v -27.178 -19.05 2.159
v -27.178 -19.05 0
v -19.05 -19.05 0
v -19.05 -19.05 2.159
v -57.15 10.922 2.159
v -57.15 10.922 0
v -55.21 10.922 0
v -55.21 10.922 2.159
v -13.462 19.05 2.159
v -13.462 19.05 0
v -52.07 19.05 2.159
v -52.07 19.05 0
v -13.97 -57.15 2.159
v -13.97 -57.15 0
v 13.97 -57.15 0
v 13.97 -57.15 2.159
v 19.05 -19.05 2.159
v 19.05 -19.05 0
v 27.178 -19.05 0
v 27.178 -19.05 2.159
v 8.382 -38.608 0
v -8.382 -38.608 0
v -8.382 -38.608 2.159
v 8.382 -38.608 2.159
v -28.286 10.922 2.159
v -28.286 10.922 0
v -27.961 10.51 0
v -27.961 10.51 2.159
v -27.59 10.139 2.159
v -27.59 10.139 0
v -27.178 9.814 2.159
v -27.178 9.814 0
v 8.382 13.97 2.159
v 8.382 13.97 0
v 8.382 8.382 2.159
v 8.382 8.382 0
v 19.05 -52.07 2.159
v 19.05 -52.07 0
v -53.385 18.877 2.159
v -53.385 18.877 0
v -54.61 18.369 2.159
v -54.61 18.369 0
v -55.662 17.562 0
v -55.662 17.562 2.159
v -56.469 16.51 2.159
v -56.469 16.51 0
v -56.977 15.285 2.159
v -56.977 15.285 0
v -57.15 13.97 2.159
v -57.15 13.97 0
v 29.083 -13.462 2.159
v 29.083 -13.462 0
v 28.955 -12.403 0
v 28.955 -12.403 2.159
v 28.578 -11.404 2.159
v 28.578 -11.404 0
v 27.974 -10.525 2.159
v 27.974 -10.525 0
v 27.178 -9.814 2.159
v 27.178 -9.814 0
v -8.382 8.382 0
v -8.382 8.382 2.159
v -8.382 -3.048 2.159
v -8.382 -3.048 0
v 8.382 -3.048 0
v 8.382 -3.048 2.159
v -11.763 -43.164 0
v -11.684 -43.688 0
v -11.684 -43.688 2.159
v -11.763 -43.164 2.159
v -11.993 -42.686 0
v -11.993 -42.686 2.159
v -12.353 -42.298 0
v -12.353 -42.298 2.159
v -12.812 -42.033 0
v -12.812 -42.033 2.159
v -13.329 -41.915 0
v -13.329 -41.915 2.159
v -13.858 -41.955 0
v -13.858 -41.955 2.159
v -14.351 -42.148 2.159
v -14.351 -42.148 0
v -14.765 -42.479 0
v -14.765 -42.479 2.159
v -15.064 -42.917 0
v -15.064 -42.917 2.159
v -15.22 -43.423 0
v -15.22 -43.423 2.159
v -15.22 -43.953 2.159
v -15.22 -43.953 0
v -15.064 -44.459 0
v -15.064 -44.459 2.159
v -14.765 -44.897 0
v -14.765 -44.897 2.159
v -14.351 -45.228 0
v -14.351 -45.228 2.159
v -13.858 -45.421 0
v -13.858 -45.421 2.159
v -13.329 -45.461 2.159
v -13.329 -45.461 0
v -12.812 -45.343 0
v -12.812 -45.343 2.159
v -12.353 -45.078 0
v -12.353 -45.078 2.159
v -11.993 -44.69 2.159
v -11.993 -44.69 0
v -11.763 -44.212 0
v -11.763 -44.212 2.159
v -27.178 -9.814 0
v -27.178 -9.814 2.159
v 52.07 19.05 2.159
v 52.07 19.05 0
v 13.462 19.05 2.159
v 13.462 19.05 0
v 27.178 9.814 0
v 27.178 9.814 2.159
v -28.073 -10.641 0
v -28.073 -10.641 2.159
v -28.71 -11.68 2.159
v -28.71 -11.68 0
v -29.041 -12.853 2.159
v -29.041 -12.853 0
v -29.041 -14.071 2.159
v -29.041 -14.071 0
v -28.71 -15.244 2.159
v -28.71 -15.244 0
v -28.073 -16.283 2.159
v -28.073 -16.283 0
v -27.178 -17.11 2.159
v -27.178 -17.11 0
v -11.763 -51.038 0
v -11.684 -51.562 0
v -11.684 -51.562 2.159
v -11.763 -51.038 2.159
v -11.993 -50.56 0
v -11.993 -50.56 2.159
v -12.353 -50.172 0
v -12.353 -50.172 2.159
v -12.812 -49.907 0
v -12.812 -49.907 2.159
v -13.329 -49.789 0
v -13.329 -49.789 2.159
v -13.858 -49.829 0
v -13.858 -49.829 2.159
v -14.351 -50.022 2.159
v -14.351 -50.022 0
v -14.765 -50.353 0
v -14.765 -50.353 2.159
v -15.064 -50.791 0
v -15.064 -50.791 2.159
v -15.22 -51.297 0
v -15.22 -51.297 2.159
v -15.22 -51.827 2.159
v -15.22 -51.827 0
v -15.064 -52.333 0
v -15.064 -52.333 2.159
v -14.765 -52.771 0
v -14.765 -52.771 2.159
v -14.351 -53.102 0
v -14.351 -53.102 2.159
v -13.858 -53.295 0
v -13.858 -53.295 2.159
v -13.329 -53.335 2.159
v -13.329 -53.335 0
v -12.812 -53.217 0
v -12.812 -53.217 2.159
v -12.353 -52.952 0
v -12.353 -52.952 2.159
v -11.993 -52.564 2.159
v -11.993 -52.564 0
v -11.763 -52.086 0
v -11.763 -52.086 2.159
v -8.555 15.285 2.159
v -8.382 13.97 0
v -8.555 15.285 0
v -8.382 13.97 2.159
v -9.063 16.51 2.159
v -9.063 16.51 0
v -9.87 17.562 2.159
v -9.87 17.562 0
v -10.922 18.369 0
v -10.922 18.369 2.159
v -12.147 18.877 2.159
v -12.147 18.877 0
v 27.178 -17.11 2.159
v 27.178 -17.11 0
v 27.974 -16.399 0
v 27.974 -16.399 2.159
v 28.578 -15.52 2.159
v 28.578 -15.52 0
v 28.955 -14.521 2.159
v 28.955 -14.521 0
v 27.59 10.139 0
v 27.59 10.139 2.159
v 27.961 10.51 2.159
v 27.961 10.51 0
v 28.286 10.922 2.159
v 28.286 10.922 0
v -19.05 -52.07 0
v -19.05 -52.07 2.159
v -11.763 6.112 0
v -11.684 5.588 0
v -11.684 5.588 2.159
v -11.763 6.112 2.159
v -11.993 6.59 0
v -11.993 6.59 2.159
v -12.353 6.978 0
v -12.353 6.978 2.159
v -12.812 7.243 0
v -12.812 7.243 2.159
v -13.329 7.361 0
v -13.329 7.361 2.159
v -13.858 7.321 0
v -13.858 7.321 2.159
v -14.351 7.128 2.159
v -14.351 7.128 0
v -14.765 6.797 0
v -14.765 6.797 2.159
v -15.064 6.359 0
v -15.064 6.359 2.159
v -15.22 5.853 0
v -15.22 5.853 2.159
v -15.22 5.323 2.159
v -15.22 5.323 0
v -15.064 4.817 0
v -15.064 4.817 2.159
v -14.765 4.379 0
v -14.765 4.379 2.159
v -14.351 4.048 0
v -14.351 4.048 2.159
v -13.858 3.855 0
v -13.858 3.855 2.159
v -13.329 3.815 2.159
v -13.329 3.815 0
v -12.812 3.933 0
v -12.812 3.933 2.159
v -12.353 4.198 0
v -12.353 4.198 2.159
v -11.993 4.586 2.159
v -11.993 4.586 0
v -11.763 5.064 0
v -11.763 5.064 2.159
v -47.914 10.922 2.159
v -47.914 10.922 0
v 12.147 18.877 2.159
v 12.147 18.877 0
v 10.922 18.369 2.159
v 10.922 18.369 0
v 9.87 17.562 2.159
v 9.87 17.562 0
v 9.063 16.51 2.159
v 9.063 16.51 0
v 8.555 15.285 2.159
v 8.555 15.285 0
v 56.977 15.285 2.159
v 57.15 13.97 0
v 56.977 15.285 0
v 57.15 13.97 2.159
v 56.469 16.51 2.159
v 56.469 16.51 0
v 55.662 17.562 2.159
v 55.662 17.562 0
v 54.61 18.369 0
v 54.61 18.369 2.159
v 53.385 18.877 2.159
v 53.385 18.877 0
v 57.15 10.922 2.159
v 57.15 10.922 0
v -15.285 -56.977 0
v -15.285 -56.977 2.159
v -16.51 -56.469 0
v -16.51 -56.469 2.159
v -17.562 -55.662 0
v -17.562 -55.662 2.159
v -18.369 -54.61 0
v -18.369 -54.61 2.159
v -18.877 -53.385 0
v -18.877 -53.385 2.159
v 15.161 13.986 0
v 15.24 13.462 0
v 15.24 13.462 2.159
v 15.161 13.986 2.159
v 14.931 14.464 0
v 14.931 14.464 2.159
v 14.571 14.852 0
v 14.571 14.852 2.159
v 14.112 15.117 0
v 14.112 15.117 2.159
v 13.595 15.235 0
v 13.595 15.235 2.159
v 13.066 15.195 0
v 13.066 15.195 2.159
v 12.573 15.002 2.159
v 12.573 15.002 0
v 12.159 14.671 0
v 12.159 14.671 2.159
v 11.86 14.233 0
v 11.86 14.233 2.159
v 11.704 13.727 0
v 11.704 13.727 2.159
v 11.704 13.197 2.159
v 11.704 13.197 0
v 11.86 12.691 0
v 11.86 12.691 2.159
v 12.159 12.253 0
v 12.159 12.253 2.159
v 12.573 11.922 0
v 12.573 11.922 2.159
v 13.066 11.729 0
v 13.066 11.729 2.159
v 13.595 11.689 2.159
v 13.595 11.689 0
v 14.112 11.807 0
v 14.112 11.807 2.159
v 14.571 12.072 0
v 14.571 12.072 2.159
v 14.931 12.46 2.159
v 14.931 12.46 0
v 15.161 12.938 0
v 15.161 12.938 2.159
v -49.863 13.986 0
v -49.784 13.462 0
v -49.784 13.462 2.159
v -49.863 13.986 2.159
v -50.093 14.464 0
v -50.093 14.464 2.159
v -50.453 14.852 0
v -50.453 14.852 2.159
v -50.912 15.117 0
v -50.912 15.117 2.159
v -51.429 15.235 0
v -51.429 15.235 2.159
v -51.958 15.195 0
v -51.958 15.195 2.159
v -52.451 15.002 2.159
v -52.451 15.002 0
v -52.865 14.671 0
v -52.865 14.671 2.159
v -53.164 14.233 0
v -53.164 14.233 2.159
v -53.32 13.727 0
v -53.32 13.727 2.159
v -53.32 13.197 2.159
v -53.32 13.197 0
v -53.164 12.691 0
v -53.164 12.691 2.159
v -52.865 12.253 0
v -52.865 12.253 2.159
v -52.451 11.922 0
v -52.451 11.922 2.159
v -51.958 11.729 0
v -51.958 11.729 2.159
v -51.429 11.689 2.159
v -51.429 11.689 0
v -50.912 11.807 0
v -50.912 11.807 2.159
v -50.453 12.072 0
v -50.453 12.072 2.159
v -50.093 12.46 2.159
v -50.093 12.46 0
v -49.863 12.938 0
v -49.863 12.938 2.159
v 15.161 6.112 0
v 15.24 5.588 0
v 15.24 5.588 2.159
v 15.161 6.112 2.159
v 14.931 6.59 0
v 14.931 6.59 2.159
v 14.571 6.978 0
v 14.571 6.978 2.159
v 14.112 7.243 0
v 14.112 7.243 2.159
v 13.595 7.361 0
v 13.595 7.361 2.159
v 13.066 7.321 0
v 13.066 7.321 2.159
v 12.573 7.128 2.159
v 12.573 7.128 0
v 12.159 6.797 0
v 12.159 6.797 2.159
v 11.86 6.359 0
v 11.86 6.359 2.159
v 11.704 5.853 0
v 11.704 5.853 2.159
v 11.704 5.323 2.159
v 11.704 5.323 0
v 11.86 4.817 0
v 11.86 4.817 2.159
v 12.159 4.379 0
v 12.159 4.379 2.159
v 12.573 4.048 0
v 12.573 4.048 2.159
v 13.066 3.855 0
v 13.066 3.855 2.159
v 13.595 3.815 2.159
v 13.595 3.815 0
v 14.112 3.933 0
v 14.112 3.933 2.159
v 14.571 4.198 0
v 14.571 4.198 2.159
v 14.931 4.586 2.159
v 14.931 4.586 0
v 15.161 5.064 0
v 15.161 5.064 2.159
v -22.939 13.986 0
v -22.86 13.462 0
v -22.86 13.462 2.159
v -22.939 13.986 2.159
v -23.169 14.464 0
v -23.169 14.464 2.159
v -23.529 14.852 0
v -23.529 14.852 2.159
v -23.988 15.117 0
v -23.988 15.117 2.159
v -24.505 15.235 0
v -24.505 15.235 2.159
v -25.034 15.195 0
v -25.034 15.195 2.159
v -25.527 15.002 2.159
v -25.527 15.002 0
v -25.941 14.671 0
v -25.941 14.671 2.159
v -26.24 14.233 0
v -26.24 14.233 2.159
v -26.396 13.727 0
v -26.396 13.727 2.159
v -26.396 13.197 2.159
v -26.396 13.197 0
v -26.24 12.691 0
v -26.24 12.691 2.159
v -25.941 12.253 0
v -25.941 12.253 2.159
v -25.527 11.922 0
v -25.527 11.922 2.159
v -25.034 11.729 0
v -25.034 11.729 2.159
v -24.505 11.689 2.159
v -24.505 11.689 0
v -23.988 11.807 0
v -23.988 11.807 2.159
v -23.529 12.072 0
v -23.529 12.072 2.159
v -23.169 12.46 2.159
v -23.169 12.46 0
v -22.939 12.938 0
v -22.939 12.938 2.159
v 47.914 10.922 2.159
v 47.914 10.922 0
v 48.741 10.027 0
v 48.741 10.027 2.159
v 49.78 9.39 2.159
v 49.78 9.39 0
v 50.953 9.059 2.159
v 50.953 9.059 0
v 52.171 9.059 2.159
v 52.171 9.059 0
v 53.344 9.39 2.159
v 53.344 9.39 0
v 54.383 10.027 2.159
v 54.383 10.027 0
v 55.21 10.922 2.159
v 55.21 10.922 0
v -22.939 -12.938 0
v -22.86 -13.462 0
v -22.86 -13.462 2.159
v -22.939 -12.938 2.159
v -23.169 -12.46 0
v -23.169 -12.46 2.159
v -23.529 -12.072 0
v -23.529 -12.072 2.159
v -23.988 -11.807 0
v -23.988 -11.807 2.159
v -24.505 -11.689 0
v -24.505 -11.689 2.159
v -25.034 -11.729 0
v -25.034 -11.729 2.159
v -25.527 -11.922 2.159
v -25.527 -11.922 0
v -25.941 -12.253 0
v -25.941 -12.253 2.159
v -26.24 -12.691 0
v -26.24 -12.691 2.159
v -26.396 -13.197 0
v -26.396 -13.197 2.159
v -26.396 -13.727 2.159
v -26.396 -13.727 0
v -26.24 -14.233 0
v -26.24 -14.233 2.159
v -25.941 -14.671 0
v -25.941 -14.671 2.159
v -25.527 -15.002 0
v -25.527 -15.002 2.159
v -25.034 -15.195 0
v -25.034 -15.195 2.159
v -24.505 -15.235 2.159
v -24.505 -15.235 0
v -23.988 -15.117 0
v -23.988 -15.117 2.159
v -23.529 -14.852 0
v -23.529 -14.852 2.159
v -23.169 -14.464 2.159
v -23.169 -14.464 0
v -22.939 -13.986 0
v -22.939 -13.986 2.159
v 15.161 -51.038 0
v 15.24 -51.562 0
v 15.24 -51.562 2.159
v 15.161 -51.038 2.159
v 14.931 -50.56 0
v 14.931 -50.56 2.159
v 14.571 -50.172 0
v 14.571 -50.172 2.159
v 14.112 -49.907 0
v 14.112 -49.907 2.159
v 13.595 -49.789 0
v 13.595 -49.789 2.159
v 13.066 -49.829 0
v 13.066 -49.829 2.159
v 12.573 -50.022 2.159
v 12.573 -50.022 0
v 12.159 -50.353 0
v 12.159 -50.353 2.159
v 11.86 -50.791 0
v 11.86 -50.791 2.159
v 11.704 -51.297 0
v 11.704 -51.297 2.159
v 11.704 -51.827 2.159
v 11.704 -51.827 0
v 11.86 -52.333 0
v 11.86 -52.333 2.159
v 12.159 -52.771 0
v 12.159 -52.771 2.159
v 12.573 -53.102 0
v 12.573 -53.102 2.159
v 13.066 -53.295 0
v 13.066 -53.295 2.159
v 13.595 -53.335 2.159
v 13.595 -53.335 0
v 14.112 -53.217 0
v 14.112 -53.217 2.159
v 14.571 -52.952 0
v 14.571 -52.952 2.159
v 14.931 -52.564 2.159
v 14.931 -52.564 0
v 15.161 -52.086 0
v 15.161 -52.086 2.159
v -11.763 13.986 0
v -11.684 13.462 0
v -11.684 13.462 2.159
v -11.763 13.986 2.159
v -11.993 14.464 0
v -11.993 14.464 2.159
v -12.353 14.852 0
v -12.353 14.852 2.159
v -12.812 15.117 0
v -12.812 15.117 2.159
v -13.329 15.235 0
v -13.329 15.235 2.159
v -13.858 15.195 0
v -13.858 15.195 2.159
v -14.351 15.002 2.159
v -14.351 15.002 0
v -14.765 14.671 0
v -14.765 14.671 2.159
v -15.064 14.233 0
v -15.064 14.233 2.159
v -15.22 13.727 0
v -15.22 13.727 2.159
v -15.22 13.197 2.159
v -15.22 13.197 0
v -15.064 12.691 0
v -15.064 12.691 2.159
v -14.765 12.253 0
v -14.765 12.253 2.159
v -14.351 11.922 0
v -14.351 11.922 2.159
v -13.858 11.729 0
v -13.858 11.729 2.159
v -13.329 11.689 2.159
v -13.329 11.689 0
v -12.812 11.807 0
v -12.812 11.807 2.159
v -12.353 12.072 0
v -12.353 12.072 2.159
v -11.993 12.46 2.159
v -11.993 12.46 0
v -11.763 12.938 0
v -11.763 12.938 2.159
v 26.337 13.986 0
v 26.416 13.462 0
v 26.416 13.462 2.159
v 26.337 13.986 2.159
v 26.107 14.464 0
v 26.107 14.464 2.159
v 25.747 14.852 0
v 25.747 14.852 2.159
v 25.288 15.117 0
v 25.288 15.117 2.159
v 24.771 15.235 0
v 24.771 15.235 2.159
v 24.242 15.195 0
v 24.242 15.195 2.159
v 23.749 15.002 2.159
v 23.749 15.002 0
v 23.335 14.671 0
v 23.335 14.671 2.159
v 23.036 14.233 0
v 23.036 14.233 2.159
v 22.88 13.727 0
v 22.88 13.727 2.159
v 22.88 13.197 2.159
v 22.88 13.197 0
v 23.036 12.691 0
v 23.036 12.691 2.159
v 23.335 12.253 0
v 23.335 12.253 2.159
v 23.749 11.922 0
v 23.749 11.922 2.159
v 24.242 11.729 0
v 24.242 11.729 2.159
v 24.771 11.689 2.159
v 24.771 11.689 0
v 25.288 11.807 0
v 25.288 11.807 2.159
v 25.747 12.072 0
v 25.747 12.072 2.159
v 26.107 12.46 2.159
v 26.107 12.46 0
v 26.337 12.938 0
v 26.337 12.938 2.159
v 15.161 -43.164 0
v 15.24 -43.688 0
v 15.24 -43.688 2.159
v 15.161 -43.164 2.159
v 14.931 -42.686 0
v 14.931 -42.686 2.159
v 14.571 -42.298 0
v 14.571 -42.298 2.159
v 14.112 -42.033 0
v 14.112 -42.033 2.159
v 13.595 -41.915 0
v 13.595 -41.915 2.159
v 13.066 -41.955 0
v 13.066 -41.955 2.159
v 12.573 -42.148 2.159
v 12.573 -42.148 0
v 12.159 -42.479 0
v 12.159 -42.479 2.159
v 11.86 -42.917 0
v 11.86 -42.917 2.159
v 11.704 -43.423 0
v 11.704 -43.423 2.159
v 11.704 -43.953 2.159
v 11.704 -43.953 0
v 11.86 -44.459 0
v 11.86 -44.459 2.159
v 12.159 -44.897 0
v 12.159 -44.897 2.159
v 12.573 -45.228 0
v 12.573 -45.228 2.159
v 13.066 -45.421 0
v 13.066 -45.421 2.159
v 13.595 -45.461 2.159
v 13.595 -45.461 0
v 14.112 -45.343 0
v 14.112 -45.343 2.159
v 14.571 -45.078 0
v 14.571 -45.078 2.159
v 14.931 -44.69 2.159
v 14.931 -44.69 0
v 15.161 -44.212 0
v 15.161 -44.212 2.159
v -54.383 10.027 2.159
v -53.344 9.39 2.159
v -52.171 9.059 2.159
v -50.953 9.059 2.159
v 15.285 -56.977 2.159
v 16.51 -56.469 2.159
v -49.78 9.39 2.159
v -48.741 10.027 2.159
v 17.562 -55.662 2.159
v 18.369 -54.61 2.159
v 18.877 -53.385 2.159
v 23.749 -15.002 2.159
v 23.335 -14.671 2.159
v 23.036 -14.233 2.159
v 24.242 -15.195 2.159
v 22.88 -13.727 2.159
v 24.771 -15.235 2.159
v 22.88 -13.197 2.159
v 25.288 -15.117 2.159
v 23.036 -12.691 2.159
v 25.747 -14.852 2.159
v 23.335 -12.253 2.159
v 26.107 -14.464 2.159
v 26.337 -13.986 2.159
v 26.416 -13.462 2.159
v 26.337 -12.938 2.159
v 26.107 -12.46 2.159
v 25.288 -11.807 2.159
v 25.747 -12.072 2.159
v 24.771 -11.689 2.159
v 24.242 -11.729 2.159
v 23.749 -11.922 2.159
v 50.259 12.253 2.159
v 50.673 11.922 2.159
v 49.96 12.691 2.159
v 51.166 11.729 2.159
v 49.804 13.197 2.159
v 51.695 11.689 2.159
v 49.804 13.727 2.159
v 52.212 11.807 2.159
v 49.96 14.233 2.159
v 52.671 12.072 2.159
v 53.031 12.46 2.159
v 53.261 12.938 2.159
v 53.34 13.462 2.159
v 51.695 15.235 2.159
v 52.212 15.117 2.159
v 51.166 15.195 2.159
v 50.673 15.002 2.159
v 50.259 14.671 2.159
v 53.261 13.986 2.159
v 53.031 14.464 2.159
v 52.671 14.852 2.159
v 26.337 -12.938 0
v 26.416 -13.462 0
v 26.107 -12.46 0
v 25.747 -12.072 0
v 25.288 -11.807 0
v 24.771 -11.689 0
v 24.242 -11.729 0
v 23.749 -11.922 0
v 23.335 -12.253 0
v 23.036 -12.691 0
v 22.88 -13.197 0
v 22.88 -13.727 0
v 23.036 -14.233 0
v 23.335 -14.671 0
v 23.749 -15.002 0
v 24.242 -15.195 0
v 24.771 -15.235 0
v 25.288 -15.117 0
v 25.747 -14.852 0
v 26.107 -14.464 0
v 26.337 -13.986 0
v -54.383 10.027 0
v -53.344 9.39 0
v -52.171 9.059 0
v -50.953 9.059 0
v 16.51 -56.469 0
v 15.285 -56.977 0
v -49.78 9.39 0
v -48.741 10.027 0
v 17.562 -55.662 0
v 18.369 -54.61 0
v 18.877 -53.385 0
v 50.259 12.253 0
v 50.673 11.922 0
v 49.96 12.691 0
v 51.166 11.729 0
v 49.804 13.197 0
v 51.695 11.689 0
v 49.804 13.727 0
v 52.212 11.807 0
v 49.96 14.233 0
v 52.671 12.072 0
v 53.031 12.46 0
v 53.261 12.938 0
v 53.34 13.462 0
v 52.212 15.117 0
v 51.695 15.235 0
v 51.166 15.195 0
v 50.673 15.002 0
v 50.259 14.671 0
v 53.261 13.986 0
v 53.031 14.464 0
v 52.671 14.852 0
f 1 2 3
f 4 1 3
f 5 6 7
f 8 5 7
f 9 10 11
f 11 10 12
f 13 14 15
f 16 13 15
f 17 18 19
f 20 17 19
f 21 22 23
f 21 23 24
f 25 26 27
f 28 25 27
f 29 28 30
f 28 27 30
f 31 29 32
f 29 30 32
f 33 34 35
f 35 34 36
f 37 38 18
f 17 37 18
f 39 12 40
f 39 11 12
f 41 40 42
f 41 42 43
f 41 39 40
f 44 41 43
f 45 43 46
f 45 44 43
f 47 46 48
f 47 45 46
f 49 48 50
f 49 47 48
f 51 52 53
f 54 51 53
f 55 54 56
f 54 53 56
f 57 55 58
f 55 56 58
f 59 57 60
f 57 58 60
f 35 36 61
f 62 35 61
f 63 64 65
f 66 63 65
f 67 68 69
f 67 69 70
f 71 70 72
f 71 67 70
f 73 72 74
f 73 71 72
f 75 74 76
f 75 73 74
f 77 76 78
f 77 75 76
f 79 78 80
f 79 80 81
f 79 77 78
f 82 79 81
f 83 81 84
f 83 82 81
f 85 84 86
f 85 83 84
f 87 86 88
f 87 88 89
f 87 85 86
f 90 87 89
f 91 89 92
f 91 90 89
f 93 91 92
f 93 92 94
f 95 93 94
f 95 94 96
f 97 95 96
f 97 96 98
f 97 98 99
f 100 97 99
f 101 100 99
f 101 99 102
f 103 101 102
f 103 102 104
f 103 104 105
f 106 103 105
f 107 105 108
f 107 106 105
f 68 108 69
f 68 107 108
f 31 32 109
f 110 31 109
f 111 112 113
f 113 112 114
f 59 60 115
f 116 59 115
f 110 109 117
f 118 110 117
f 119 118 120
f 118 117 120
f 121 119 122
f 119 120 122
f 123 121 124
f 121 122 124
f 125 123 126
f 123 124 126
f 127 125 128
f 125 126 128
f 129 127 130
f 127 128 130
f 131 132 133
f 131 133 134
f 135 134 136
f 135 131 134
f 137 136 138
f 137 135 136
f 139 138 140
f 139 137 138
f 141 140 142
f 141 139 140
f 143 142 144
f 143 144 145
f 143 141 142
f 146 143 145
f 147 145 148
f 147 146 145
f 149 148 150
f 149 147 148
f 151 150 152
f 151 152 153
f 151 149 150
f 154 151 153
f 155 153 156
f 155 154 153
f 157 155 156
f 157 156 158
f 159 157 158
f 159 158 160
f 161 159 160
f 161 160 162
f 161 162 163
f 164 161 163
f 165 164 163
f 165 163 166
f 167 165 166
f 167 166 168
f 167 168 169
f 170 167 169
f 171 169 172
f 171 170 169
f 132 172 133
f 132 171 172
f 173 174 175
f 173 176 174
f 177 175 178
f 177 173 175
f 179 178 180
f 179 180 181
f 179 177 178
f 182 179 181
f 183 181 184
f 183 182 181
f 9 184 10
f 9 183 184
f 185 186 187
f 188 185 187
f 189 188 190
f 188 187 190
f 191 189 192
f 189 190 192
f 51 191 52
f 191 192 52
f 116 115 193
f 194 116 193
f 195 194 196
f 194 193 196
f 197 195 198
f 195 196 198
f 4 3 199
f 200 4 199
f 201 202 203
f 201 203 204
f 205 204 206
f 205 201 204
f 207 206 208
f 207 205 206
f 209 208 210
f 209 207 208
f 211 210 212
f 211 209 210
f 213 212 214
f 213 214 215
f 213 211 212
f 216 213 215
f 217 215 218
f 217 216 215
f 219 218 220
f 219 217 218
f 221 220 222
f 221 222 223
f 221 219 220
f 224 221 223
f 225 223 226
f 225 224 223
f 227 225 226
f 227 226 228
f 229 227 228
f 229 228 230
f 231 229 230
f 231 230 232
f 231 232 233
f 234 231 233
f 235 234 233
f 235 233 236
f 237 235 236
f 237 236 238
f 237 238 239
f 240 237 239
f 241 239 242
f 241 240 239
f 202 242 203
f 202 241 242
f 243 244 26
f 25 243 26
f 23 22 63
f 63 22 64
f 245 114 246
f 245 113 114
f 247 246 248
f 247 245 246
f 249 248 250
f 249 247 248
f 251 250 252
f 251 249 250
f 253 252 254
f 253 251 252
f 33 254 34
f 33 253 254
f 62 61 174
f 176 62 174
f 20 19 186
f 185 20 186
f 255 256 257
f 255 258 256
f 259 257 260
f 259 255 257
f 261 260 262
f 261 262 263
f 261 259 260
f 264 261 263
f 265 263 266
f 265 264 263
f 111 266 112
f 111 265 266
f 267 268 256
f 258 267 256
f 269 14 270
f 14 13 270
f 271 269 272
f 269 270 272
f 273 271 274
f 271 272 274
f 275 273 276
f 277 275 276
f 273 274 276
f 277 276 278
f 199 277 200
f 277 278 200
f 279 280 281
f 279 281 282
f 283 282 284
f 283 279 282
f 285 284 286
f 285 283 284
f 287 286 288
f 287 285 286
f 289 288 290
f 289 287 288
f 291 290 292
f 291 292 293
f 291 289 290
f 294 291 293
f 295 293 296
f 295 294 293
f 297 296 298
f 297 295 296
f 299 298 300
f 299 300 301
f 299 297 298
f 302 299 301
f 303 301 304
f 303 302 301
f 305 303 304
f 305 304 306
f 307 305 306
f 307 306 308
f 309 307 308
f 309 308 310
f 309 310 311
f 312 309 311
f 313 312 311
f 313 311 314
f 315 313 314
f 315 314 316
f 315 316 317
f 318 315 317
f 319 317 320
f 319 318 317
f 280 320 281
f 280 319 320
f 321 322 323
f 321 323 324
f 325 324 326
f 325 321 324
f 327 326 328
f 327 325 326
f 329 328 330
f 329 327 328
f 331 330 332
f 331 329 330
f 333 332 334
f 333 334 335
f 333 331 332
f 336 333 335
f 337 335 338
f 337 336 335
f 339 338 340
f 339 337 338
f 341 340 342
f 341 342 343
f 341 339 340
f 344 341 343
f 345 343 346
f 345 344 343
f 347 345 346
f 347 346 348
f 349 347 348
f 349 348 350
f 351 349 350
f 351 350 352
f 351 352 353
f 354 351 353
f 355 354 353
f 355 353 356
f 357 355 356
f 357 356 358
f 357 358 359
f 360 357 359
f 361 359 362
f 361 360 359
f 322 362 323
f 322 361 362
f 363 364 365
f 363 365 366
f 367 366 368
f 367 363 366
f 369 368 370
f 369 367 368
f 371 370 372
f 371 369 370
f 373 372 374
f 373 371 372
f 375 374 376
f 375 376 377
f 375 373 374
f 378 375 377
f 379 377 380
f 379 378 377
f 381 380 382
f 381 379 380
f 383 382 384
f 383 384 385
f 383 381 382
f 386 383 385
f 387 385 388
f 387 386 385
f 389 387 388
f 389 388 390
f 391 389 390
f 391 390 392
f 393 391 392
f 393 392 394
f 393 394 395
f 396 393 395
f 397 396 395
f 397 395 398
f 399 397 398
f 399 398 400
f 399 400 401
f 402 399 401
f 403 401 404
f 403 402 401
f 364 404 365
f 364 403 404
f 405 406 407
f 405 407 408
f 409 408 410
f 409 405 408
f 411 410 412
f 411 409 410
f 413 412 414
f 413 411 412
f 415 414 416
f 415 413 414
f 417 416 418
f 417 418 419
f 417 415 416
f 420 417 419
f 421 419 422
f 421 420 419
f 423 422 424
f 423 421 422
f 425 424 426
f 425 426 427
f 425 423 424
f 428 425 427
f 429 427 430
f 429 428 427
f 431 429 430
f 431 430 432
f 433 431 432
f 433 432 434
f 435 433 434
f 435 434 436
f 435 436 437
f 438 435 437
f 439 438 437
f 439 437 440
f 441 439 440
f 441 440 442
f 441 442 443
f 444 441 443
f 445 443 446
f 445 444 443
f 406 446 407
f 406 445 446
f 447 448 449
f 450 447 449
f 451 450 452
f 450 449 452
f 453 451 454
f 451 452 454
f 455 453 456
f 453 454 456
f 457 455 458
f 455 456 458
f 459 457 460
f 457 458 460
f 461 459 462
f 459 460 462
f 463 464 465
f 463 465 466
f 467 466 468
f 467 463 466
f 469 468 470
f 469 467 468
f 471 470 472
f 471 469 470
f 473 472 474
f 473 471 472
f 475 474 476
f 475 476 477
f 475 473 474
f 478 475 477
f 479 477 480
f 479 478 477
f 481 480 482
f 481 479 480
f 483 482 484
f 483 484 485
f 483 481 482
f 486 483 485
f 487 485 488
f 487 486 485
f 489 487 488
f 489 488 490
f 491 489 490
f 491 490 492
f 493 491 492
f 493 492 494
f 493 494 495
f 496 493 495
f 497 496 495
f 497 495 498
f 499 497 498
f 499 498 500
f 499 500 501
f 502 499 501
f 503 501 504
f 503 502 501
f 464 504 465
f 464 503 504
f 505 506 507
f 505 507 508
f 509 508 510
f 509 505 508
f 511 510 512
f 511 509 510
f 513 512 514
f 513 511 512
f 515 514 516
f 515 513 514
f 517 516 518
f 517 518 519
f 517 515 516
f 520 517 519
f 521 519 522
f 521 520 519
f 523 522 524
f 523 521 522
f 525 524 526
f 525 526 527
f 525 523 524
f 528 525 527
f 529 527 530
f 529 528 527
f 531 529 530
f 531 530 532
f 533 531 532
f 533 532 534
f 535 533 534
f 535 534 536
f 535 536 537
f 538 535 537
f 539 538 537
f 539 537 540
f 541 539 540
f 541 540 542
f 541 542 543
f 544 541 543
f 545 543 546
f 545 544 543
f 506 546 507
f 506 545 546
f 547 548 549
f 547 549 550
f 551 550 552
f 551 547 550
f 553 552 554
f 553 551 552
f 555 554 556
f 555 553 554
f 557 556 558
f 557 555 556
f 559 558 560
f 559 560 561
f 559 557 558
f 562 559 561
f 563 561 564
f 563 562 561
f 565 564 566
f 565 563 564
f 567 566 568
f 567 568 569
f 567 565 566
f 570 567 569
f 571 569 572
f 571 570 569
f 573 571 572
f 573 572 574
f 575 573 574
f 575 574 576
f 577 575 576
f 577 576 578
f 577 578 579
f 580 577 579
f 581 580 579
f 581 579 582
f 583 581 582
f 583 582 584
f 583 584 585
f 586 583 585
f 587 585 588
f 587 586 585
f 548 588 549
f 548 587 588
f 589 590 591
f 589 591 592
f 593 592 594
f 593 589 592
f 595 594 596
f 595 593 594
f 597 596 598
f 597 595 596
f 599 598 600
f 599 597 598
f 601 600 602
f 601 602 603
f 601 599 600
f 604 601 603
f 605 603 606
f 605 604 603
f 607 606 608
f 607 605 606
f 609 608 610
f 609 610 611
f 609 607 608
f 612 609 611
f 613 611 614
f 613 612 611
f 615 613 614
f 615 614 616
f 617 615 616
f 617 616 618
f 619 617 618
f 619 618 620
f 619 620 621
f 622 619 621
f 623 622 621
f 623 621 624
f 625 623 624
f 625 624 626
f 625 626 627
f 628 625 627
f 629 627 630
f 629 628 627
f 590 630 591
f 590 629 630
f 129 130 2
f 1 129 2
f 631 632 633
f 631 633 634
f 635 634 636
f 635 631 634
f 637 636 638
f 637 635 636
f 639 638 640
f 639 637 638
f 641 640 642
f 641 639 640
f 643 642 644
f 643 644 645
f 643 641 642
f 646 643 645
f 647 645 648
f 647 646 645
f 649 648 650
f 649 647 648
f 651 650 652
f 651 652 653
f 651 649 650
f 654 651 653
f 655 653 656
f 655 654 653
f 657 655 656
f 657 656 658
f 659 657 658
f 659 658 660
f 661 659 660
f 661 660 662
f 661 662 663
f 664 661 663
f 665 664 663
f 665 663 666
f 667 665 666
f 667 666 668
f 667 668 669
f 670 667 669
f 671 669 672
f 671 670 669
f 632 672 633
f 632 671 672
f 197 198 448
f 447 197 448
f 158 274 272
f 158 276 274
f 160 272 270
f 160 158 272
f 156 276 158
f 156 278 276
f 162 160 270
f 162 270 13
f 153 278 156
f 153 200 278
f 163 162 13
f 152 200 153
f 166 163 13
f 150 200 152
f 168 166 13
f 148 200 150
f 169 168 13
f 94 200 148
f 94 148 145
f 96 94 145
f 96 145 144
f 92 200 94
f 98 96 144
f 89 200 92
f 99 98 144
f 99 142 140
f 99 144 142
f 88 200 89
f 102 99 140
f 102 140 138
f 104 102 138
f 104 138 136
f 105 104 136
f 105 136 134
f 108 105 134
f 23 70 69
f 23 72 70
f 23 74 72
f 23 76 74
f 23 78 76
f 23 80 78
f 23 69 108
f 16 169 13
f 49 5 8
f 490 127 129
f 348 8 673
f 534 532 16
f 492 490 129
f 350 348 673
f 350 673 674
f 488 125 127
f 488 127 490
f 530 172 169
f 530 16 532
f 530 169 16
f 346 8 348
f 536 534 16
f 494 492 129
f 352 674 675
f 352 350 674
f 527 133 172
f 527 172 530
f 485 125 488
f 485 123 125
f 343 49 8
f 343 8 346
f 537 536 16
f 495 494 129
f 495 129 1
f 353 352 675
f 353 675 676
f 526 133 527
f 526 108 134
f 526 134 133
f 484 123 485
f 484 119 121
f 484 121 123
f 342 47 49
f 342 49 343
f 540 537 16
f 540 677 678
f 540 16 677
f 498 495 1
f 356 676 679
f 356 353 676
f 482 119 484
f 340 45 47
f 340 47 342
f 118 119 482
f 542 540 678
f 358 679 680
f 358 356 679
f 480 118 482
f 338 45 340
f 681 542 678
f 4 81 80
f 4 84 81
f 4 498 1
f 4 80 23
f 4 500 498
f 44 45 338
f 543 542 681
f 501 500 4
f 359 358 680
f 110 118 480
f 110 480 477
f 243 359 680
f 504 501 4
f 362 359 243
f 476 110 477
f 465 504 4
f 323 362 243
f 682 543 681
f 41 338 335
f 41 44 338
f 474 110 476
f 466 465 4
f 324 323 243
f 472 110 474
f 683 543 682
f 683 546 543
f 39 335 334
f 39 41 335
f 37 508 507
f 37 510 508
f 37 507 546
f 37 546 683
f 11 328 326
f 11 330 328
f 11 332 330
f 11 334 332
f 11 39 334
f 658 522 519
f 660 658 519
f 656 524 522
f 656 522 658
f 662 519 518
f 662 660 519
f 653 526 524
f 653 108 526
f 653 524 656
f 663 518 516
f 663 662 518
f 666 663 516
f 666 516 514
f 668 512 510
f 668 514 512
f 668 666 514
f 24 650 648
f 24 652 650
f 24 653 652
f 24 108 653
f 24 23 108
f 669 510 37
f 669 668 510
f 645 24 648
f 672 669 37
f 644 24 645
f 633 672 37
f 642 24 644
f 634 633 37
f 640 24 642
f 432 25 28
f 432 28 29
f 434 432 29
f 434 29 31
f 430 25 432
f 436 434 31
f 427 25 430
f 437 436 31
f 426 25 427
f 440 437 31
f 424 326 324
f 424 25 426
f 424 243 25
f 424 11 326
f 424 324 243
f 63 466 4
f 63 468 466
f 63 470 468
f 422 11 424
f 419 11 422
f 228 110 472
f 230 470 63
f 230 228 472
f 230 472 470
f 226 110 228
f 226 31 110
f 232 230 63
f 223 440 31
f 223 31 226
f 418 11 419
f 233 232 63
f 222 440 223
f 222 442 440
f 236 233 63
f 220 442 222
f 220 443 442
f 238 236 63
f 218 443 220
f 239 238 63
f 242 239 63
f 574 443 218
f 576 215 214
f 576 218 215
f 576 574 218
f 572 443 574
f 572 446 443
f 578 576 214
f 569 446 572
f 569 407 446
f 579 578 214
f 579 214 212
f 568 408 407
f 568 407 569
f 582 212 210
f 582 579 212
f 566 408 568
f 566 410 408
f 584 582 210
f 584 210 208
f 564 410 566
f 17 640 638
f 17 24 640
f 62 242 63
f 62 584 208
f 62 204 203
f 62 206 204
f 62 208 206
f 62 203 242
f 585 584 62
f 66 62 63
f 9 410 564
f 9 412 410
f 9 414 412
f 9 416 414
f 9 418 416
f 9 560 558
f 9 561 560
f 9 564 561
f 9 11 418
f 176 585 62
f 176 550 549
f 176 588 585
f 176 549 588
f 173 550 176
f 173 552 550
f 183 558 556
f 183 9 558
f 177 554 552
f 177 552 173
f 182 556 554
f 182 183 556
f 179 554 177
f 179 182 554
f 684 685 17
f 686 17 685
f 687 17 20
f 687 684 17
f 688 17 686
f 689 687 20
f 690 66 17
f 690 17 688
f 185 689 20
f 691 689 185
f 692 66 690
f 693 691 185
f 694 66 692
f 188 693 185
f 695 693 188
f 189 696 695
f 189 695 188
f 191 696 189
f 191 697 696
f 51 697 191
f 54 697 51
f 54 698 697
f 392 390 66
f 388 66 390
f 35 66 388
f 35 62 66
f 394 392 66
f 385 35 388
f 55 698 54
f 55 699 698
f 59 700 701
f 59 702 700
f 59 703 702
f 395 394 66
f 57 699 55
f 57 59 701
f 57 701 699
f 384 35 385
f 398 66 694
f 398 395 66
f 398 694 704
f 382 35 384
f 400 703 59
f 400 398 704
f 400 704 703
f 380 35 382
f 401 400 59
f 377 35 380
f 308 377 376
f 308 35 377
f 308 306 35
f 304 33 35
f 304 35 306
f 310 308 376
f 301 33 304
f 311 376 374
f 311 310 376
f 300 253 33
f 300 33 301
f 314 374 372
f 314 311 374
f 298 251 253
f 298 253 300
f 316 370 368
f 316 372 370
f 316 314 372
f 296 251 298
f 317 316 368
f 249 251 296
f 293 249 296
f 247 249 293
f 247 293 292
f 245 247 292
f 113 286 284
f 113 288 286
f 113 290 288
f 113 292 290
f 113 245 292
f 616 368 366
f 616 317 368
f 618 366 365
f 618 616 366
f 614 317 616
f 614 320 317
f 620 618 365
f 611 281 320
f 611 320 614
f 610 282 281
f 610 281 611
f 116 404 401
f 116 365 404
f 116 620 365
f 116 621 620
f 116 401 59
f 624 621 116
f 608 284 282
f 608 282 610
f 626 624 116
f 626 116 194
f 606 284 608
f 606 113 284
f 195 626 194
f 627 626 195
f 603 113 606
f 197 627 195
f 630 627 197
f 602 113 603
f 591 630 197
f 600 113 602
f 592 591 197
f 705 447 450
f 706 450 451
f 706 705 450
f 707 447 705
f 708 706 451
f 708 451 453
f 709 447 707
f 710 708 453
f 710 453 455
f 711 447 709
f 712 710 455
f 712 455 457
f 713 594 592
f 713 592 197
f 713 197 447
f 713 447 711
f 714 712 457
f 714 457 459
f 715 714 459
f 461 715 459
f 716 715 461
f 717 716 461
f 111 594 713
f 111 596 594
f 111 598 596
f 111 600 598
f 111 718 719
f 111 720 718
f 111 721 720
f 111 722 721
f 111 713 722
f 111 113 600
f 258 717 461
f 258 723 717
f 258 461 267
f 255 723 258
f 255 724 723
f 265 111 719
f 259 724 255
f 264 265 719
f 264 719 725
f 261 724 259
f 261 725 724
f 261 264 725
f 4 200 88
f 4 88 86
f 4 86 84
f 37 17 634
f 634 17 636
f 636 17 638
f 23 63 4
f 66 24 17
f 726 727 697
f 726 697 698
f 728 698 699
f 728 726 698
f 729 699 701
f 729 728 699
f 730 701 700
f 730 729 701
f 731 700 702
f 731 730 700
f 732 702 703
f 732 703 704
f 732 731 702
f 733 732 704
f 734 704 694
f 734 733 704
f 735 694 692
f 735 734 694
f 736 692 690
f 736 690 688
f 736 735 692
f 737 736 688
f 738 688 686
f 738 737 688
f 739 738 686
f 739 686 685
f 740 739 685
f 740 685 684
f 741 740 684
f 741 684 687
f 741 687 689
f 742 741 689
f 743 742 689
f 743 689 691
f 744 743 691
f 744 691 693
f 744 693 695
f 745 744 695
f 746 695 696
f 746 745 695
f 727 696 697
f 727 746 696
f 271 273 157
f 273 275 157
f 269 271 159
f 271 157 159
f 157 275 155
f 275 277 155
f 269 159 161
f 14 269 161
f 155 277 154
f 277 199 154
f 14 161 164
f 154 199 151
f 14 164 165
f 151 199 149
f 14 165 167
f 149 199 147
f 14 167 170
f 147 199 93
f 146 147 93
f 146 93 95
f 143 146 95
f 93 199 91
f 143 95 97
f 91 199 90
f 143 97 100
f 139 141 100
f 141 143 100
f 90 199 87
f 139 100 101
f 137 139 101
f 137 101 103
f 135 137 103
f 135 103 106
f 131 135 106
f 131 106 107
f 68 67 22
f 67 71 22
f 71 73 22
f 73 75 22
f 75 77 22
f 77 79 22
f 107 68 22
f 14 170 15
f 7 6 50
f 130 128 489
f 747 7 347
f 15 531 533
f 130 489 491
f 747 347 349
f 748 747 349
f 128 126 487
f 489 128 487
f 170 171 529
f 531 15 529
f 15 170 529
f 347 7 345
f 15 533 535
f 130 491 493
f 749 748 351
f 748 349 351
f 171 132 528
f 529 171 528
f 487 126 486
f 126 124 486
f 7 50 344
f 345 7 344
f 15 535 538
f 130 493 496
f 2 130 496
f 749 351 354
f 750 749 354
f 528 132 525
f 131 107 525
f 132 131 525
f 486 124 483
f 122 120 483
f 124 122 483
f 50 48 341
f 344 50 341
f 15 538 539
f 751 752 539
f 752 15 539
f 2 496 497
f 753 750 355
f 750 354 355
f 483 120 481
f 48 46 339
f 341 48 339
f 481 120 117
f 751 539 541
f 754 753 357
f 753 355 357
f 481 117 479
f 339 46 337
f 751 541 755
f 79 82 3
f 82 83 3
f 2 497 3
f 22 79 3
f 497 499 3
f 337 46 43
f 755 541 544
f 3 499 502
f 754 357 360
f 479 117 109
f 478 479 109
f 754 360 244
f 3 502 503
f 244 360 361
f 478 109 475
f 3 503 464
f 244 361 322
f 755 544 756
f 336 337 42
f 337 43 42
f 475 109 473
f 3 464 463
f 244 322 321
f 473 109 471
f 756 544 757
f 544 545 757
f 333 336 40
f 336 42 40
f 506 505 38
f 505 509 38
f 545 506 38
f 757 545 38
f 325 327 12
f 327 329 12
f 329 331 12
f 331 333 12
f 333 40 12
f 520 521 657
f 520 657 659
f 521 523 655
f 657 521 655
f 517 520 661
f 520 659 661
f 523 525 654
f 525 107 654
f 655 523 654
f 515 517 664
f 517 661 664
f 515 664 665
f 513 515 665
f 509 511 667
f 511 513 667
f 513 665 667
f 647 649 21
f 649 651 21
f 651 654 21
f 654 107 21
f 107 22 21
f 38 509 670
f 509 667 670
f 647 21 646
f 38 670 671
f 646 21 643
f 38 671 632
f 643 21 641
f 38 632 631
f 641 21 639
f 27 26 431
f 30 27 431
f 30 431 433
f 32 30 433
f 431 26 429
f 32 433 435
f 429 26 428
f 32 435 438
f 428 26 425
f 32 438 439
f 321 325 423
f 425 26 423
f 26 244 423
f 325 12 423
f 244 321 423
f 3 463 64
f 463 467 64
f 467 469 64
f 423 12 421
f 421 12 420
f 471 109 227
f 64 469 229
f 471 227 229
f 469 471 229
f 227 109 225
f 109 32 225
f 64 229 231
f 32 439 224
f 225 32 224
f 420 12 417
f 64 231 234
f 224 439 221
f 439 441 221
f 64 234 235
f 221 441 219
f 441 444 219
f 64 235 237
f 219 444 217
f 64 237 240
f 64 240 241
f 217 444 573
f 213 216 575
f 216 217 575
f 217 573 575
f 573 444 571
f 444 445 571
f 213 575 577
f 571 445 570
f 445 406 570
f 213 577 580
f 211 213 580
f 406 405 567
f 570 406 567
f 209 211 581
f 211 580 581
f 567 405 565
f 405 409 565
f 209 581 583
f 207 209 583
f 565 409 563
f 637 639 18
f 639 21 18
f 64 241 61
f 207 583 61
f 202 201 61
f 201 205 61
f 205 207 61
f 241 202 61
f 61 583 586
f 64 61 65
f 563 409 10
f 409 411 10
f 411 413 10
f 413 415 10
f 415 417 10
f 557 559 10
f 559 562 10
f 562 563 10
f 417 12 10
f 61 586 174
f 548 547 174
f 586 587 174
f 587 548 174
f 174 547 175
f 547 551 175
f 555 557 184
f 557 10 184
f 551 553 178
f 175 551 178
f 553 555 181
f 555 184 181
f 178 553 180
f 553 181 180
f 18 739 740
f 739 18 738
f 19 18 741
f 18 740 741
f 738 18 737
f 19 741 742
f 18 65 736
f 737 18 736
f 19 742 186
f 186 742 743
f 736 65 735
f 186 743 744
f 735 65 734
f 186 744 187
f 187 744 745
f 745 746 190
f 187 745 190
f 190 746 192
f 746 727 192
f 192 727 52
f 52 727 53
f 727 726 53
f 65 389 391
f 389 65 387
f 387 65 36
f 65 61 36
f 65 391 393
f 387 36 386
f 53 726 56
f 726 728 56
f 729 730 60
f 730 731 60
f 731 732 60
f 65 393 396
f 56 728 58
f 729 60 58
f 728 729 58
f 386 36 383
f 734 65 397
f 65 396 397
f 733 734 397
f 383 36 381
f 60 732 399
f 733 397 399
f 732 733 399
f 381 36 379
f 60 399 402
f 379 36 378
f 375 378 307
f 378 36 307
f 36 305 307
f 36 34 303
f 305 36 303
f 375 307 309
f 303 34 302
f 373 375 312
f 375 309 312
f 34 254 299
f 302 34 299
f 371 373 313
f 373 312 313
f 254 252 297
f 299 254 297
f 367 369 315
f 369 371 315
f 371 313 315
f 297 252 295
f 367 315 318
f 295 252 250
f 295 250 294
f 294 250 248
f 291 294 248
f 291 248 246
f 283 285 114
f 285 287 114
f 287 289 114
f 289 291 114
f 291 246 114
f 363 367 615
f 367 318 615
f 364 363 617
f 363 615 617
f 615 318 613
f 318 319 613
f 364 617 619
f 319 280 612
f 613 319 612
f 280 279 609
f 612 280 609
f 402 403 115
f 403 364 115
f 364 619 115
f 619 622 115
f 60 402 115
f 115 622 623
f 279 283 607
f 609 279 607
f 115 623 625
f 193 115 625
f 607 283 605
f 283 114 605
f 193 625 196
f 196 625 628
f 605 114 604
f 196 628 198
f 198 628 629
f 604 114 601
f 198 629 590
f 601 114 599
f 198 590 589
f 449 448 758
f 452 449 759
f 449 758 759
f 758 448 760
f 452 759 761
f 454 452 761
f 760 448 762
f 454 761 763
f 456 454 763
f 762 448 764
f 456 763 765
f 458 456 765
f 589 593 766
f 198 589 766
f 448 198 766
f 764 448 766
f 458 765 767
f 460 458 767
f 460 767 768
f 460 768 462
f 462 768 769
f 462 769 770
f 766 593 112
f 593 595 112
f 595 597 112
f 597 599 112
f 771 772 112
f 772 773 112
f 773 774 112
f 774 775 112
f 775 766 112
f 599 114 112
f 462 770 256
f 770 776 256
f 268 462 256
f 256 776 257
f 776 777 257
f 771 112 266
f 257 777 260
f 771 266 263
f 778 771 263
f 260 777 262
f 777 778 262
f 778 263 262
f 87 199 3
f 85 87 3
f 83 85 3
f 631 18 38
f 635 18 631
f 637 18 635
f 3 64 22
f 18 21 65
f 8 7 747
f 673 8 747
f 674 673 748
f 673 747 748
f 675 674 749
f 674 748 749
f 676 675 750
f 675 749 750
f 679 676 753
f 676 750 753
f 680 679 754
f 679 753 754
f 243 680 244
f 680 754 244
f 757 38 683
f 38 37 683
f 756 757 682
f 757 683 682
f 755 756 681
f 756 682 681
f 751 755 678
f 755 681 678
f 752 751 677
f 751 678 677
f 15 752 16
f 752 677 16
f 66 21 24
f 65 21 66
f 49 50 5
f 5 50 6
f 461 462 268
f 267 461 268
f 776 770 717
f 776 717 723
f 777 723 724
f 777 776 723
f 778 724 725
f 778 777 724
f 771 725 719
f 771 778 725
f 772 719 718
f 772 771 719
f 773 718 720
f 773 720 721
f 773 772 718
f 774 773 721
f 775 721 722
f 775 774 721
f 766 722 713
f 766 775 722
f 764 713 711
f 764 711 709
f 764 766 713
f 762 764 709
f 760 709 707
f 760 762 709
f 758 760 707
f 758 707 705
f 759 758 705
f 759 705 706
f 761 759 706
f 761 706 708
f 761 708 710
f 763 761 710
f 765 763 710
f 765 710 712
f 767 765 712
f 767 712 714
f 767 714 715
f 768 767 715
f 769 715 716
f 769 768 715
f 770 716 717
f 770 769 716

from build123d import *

# Parameters (mm, degrees)
F0_R     = 1.778
F0_W     = 16.764
F0_H     = 35.56
F1_DEPTH = 2.159
F2_R     = 5.08


with BuildPart() as f1:
    # F0 (on Top) → F1 (new body)
    with BuildSketch(Plane.XY):
        with BuildLine():
            Line((57.15, 10.922), (57.15, 19.05))
            Line((57.15, 19.05), (8.382, 19.05))
            Line((8.382, 19.05), (8.382, 8.382))
            Line((8.382, 8.382), (-8.382, 8.382))
            Line((-8.382, 8.382), (-8.382, 19.05))
            Line((-8.382, 19.05), (-57.15, 19.05))
            Line((-57.15, 19.05), (-57.15, 10.922))
            Line((-57.15, 10.922), (-55.209797, 10.922))
            ThreePointArc((-55.209797, 10.922), (-52.893083, 17.703019), (-47.117, 13.462))
            ThreePointArc((-47.117, 13.462), (-47.320981, 12.130917), (-47.914203, 10.922))
            Line((-47.914203, 10.922), (-28.285797, 10.922))
            ThreePointArc((-28.285797, 10.922), (-25.969083, 17.703019), (-20.193, 13.462))
            ThreePointArc((-20.193, 13.462), (-22.580365, 9.521929), (-27.178, 9.814203))
            Line((-27.178, 9.814203), (-27.178, -9.814203))
            ThreePointArc((-27.178, -9.814203), (-22.580365, -9.521929), (-20.193, -13.462))
            ThreePointArc((-20.193, -13.462), (-22.580365, -17.402071), (-27.178, -17.109797))
            Line((-27.178, -17.109797), (-27.178, -19.05))
            Line((-27.178, -19.05), (-19.05, -19.05))
            Line((-19.05, -19.05), (-19.05, -57.15))
            Line((-19.05, -57.15), (19.05, -57.15))
            Line((19.05, -57.15), (19.05, -19.05))
            Line((19.05, -19.05), (27.178, -19.05))
            Line((27.178, -19.05), (27.178, -17.109797))
            ThreePointArc((27.178, -17.109797), (20.193, -13.462), (27.178, -9.814203))
            Line((27.178, -9.814203), (27.178, 9.814203))
            ThreePointArc((27.178, 9.814203), (20.697929, 15.519635), (29.083, 13.462))
            ThreePointArc((29.083, 13.462), (28.879019, 12.130917), (28.285797, 10.922))
            Line((28.285797, 10.922), (47.914203, 10.922))
            ThreePointArc((47.914203, 10.922), (50.230917, 17.703019), (56.007, 13.462))
            ThreePointArc((56.007, 13.462), (55.803019, 12.130917), (55.209797, 10.922))
            Line((55.209797, 10.922), (57.15, 10.922))
        make_face()
        with Locations((-13.462, -51.562)):
            Circle(F0_R, mode=Mode.SUBTRACT)
        with Locations((-13.462, -43.688)):
            Circle(F0_R, mode=Mode.SUBTRACT)
        with Locations((13.462, -51.562)):
            Circle(F0_R, mode=Mode.SUBTRACT)
        with Locations((13.462, -43.688)):
            Circle(F0_R, mode=Mode.SUBTRACT)
        with Locations((0, -20.828)):
            Rectangle(F0_W, F0_H, mode=Mode.SUBTRACT)
        with Locations((-13.462, 5.588)):
            Circle(F0_R, mode=Mode.SUBTRACT)
        with Locations((-13.462, 13.462)):
            Circle(F0_R, mode=Mode.SUBTRACT)
        with Locations((13.462, 5.588)):
            Circle(F0_R, mode=Mode.SUBTRACT)
        with Locations((13.462, 13.462)):
            Circle(F0_R, mode=Mode.SUBTRACT)
        with BuildLine():
            ThreePointArc((47.914203, 10.922), (51.562, 9.017), (55.209797, 10.922))
            ThreePointArc((55.209797, 10.922), (55.803019, 12.130917), (56.007, 13.462))
            ThreePointArc((56.007, 13.462), (50.230917, 17.703019), (47.914203, 10.922))
        make_face()
        with Locations((51.562, 13.462)):
            Circle(F0_R, mode=Mode.SUBTRACT)
        with BuildLine():
            ThreePointArc((27.178, 9.814203), (27.78109, 10.31891), (28.285797, 10.922))
            ThreePointArc((28.285797, 10.922), (28.879019, 12.130917), (29.083, 13.462))
            ThreePointArc((29.083, 13.462), (20.697929, 15.519635), (27.178, 9.814203))
        make_face()
        with Locations((24.638, 13.462)):
            Circle(F0_R, mode=Mode.SUBTRACT)
        with BuildLine():
            ThreePointArc((29.083, -13.462), (28.578071, -11.404365), (27.178, -9.814203))
            ThreePointArc((27.178, -9.814203), (20.193, -13.462), (27.178, -17.109797))
            ThreePointArc((27.178, -17.109797), (28.578071, -15.519635), (29.083, -13.462))
        make_face()
        with Locations((24.638, -13.462)):
            Circle(F0_R, mode=Mode.SUBTRACT)
        with BuildLine():
            ThreePointArc((-47.117, 13.462), (-52.893083, 17.703019), (-55.209797, 10.922))
            ThreePointArc((-55.209797, 10.922), (-51.562, 9.017), (-47.914203, 10.922))
            ThreePointArc((-47.914203, 10.922), (-47.320981, 12.130917), (-47.117, 13.462))
        make_face()
        with Locations((-51.562, 13.462)):
            Circle(F0_R, mode=Mode.SUBTRACT)
        with BuildLine():
            ThreePointArc((-20.193, 13.462), (-25.969083, 17.703019), (-28.285797, 10.922))
            ThreePointArc((-28.285797, 10.922), (-27.78109, 10.31891), (-27.178, 9.814203))
            ThreePointArc((-27.178, 9.814203), (-22.580365, 9.521929), (-20.193, 13.462))
        make_face()
        with Locations((-24.638, 13.462)):
            Circle(F0_R, mode=Mode.SUBTRACT)
        with BuildLine():
            ThreePointArc((-20.193, -13.462), (-22.580365, -9.521929), (-27.178, -9.814203))
            ThreePointArc((-27.178, -9.814203), (-29.083, -13.462), (-27.178, -17.109797))
            ThreePointArc((-27.178, -17.109797), (-22.580365, -17.402071), (-20.193, -13.462))
        make_face()
        with Locations((-24.638, -13.462)):
            Circle(F0_R, mode=Mode.SUBTRACT)
    extrude(amount=F1_DEPTH)

    # F2
    f2_edges = [f1.edges().sort_by_distance(p)[0] for p in [
        (57.15, 19.05, 1.0795),
        (8.382, 19.05, 1.0795),
        (-8.382, 19.05, 1.0795),
        (19.05, -57.15, 1.0795),
        (-19.05, -57.15, 1.0795),
        (-57.15, 19.05, 1.0795),
    ]]
    fillet(f2_edges, radius=F2_R)


solid = f1.part
